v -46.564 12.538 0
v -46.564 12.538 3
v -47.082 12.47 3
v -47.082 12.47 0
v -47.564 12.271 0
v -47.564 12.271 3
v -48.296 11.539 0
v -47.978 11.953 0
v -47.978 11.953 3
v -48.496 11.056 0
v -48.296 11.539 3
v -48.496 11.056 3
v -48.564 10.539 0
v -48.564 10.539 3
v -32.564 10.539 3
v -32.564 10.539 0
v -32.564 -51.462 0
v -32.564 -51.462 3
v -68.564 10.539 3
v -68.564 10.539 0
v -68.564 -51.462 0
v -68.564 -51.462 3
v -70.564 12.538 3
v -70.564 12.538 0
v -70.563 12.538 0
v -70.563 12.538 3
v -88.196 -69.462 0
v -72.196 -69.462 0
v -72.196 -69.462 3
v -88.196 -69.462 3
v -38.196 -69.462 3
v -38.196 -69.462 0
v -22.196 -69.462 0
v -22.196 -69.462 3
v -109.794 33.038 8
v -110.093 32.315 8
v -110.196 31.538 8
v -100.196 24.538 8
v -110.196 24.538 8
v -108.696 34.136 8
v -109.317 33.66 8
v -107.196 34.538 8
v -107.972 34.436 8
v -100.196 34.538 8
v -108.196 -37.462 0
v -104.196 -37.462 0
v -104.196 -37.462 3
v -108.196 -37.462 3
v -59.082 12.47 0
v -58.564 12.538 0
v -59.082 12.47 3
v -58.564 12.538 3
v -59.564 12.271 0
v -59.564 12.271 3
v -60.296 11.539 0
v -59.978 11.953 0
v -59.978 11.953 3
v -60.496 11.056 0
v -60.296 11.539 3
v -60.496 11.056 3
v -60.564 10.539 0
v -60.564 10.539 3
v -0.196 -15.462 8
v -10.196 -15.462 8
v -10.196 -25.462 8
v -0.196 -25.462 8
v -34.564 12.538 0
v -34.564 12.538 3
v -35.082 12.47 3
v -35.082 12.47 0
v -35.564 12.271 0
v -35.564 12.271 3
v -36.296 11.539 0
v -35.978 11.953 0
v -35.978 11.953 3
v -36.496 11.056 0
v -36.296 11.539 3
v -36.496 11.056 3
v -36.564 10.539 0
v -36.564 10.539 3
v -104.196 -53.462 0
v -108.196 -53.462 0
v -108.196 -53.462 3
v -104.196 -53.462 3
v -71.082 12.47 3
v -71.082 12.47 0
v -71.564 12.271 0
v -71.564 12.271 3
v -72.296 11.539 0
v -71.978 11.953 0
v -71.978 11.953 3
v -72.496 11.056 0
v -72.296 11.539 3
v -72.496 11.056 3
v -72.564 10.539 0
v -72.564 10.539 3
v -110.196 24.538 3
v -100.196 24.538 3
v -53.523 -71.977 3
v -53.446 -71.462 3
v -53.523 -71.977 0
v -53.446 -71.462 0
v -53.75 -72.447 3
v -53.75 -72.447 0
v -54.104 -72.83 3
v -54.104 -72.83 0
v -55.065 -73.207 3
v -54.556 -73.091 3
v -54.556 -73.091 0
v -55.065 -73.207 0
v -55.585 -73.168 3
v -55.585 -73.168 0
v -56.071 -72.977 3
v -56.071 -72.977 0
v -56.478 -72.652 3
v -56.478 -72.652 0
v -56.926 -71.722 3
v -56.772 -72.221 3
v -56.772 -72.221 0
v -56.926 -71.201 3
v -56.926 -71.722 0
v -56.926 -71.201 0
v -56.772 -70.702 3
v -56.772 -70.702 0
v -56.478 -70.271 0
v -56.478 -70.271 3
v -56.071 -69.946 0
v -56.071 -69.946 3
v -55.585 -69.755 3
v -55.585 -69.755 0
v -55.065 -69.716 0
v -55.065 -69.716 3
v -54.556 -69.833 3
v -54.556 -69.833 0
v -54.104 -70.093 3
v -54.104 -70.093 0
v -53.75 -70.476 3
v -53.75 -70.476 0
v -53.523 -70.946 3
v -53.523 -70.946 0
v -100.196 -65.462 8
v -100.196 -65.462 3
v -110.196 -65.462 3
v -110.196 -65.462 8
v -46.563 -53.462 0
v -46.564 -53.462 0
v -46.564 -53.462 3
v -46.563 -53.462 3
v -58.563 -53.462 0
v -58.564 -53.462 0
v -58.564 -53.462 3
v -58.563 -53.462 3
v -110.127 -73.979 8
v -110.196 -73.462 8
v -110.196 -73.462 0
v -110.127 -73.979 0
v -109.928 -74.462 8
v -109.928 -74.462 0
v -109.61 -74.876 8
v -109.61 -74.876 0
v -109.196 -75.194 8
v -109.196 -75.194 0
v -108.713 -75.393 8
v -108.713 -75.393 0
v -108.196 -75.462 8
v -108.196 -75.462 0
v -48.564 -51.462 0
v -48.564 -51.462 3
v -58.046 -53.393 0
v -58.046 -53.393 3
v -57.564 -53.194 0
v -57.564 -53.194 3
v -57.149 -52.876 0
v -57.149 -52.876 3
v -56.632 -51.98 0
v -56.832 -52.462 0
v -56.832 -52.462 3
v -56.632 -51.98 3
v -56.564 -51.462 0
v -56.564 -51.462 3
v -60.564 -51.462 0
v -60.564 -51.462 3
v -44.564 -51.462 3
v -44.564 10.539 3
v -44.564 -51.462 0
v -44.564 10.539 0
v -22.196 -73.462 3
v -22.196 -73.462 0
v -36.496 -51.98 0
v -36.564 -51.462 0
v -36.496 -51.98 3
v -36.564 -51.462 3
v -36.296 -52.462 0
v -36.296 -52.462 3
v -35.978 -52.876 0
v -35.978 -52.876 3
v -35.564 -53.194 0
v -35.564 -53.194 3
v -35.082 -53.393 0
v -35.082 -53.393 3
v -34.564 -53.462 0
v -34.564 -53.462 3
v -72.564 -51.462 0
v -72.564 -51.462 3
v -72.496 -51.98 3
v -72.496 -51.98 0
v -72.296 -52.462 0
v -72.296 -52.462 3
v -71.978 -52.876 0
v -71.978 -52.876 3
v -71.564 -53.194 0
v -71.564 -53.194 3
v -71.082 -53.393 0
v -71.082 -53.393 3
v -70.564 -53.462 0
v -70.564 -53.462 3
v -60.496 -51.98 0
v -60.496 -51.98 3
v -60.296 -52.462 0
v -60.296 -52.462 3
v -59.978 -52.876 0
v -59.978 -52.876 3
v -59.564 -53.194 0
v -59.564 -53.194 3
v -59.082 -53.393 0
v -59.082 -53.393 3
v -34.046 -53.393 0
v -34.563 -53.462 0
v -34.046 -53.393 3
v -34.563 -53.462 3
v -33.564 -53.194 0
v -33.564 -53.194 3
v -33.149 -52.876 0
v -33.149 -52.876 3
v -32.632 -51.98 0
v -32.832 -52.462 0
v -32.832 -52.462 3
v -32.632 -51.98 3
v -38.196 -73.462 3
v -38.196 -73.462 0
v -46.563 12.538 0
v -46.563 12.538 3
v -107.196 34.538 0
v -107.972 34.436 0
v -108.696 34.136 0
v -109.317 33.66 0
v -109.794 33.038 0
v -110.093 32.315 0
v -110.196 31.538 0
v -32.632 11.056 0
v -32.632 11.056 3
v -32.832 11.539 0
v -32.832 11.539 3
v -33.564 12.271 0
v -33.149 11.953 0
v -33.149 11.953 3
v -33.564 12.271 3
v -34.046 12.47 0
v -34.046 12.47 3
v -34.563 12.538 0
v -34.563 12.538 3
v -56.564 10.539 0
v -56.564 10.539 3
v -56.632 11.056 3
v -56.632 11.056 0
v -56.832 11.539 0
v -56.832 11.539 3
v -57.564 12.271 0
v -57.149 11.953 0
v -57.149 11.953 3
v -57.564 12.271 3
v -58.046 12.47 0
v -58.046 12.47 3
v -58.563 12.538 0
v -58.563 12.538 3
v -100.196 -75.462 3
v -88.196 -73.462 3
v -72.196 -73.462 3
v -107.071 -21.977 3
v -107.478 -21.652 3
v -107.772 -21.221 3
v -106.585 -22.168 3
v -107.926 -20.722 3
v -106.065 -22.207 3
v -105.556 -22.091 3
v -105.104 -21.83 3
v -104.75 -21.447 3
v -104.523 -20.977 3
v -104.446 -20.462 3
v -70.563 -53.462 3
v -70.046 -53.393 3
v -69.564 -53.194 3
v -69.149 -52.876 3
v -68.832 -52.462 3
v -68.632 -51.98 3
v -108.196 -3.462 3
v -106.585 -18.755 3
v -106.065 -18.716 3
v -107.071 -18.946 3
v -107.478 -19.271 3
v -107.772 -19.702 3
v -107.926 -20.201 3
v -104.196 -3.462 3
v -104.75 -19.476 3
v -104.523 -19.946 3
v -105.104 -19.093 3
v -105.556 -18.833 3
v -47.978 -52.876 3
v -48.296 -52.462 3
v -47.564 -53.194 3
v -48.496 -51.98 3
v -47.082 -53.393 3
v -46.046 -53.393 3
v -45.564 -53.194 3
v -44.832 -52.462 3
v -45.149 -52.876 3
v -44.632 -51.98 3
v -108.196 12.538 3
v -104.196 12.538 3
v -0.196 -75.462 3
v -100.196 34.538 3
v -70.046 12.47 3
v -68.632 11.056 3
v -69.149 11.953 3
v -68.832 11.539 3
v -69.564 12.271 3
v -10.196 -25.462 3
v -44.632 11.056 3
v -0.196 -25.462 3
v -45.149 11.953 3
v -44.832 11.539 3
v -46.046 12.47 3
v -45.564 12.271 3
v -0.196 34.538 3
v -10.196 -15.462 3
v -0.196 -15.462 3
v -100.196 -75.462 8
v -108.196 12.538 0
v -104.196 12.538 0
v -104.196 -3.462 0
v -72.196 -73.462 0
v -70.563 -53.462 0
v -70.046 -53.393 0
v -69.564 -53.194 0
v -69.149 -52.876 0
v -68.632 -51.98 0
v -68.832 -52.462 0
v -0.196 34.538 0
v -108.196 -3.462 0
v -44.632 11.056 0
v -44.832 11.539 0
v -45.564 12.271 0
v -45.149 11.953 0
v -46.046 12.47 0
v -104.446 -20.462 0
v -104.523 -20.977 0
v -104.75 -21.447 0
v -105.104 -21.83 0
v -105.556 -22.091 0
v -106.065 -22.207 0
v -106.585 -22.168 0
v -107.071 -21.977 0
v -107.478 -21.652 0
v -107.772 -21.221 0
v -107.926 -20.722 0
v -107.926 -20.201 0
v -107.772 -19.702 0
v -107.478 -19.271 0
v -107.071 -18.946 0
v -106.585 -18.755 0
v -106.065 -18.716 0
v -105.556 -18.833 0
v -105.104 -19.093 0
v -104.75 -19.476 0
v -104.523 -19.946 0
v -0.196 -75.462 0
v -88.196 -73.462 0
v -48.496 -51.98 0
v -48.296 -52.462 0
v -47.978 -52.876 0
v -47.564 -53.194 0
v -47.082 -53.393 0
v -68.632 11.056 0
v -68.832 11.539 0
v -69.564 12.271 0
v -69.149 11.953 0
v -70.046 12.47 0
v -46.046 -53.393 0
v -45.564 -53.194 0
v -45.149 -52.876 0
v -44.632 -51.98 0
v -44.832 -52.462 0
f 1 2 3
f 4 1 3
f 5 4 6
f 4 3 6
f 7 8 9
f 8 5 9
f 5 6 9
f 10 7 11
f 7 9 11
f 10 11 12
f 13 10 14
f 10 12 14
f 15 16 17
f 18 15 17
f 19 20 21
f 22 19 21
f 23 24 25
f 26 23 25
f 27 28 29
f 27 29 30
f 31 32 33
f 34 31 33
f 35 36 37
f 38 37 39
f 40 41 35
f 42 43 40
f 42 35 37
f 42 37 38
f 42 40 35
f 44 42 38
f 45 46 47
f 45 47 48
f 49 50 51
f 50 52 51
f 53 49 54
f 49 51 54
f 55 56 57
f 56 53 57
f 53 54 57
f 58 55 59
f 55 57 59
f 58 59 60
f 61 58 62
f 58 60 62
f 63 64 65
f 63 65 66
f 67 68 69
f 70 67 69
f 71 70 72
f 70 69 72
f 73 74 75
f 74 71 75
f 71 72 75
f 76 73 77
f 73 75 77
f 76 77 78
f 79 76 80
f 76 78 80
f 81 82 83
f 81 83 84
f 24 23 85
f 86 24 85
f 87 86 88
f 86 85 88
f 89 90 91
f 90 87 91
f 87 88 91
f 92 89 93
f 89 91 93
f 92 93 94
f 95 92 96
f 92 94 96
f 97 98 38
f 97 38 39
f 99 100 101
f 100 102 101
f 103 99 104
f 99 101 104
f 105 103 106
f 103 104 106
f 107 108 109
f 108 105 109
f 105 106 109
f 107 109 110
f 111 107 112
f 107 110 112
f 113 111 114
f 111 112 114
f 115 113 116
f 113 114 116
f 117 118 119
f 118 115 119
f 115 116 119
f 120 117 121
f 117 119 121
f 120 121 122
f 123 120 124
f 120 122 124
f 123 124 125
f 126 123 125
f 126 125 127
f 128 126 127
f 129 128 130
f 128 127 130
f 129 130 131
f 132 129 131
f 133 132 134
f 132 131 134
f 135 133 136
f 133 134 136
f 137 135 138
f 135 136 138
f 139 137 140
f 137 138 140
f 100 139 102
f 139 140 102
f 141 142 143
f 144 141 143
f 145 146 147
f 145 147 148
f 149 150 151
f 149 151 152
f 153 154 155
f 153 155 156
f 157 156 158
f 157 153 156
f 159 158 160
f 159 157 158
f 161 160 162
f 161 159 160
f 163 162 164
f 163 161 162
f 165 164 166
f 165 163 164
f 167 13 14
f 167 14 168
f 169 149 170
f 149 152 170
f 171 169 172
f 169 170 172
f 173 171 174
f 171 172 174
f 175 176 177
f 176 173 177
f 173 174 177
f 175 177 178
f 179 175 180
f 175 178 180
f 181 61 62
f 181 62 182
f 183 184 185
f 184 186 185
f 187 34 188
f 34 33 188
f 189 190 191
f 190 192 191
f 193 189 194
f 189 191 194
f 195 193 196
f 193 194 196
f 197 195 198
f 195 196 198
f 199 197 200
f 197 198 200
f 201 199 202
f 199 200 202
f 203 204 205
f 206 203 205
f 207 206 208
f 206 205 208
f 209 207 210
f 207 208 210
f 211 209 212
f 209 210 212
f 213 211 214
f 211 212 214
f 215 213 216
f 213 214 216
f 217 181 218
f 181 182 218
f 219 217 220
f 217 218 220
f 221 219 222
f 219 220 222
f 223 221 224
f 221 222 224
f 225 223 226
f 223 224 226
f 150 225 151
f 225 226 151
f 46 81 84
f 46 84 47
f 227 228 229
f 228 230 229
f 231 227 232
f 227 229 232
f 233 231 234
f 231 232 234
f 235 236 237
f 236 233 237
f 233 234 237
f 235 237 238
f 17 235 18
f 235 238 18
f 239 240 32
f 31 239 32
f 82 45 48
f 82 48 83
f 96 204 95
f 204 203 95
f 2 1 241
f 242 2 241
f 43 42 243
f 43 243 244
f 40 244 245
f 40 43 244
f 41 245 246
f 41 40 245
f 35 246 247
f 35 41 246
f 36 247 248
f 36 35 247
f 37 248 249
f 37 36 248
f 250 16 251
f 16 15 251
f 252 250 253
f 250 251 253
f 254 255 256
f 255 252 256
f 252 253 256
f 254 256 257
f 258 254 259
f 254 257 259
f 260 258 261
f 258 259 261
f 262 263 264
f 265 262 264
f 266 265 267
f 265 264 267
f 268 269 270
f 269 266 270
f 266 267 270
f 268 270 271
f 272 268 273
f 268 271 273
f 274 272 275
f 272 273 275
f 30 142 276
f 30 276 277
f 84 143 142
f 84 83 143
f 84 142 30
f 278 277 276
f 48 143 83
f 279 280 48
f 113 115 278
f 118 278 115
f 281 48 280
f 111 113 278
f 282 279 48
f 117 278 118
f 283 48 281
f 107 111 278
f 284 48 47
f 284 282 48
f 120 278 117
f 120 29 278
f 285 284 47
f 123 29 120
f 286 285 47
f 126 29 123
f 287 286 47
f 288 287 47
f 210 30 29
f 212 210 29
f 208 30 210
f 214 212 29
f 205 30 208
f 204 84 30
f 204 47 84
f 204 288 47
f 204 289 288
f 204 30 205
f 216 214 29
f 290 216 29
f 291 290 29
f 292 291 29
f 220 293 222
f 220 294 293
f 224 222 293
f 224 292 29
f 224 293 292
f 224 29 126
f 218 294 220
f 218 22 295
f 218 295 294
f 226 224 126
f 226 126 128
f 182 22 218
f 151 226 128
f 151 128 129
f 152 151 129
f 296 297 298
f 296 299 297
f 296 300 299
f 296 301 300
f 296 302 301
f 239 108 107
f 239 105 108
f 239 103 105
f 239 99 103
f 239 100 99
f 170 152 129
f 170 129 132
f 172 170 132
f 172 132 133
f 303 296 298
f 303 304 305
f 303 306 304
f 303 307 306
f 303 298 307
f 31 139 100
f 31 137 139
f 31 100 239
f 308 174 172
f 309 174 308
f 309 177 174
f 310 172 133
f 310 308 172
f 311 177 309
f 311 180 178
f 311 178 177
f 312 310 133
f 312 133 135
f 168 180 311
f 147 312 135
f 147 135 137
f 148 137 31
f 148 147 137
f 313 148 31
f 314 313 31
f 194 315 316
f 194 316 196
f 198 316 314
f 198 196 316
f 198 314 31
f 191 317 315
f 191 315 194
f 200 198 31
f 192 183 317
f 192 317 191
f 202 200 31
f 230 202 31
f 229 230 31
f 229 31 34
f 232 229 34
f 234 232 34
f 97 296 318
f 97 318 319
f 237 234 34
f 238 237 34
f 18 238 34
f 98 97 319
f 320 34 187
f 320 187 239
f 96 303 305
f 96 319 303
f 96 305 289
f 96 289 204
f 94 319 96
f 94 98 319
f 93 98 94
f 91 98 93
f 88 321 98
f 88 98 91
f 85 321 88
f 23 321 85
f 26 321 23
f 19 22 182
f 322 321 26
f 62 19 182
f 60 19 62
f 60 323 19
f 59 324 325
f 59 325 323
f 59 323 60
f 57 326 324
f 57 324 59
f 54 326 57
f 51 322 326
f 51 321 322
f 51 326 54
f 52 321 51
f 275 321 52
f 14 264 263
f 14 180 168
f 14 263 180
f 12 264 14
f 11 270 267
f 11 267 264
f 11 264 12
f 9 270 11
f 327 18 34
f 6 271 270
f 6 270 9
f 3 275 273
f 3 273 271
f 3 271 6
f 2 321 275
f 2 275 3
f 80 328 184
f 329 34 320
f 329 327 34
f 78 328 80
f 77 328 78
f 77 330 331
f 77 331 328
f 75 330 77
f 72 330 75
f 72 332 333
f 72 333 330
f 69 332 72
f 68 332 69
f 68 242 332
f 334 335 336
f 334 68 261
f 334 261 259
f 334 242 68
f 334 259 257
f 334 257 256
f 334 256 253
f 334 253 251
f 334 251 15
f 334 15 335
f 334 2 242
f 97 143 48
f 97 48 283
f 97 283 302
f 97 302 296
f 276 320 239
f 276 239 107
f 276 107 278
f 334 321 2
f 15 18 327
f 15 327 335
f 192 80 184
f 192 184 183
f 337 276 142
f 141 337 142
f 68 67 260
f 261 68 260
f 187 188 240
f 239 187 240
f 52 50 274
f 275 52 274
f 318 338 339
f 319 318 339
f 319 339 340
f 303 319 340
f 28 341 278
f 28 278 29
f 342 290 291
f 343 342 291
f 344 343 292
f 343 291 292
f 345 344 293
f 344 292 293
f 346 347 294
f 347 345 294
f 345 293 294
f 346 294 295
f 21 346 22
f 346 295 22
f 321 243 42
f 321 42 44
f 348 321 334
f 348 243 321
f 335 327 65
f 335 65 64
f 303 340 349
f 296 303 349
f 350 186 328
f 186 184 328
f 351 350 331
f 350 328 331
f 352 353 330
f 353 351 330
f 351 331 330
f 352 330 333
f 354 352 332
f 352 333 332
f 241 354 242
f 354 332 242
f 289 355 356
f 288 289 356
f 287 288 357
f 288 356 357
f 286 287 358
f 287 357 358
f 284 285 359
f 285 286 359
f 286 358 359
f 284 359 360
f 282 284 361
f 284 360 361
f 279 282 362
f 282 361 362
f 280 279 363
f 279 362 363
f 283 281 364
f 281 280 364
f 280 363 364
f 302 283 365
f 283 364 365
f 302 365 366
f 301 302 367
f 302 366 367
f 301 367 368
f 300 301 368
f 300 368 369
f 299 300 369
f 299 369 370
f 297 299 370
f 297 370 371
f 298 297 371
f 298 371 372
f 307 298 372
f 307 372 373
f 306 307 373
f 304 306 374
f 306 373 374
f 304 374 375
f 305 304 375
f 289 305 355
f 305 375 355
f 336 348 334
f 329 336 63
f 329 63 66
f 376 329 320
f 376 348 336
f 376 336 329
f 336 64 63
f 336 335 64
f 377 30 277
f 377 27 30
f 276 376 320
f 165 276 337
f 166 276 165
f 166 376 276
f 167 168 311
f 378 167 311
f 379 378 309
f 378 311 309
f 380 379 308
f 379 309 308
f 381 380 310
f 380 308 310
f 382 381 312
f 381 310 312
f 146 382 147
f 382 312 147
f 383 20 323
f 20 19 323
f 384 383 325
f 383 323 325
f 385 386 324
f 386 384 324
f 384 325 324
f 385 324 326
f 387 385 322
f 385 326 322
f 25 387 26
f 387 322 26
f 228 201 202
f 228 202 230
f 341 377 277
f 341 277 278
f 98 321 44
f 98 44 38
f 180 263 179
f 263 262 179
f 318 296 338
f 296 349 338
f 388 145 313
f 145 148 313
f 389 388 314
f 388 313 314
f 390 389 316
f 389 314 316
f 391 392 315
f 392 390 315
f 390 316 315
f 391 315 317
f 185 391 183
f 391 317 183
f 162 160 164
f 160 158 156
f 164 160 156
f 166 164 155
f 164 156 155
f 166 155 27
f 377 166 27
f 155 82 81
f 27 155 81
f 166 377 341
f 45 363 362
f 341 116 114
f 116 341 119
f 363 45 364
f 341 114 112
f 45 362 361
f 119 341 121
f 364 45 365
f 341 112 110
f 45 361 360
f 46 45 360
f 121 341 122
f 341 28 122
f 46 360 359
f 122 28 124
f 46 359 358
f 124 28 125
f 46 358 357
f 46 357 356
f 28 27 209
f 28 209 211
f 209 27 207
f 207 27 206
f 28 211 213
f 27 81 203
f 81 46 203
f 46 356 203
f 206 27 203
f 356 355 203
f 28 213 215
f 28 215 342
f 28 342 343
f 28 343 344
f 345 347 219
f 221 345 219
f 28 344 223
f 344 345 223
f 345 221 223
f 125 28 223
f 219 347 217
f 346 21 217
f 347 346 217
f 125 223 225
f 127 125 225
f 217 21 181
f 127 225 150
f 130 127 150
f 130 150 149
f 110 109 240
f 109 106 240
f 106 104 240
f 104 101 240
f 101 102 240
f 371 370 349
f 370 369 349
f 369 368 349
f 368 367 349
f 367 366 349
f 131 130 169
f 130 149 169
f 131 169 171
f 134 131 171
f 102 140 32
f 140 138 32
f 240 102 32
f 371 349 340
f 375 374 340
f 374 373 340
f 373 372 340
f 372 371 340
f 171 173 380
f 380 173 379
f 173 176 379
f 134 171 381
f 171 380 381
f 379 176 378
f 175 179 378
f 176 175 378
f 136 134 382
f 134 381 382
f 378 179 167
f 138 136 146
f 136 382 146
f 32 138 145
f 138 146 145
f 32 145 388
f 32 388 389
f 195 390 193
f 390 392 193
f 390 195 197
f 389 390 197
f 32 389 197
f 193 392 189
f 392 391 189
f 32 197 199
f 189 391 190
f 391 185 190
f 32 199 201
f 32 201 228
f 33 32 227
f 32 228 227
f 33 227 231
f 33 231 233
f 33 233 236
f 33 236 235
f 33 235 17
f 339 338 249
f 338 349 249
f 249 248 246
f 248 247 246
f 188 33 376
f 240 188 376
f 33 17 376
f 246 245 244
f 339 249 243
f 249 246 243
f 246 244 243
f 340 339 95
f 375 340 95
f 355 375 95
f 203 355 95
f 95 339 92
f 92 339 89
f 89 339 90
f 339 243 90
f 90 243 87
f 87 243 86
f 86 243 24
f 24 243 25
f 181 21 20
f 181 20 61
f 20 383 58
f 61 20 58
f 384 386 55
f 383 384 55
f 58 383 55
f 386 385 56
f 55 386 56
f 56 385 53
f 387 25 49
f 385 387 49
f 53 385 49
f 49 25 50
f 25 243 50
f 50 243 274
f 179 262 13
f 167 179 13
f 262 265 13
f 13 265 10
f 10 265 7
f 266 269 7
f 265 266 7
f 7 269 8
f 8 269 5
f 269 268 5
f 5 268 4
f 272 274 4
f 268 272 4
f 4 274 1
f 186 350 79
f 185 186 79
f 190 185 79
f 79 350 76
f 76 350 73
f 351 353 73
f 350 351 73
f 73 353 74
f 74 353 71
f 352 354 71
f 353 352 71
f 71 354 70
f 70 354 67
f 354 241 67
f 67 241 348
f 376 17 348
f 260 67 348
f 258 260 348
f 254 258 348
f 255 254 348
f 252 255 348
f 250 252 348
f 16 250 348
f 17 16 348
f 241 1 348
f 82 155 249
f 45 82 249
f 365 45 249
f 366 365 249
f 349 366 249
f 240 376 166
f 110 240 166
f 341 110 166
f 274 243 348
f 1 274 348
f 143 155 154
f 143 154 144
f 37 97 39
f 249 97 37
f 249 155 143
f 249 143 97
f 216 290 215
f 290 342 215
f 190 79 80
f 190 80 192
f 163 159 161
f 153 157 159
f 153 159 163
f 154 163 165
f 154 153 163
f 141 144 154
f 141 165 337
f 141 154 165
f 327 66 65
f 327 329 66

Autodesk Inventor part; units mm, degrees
ref_plane "YZ Plane" through (0, 0, 0) normal (1, 0, 0) x (0, 1, 0)
ref_plane "XZ Plane" through (0, 0, 0) normal (0, 1, 0) x (-1, 0, 0)
ref_plane "XY Plane" through (0, 0, 0) normal (0, 0, 1) x (1, 0, 0)
sketch "Sketch1" plane through (0, 0, 0) normal (0, 0, 1) x (1, 0, 0)
  line L0 (-0.1956, -75.4616) -> (-110.1956, -75.4616)
  line L1 (-110.1956, -75.4616) -> (-110.1956, 34.5384)
  line L2 (-110.1956, 34.5384) -> (-0.1956, 34.5384)
  line L3 (-110.1956, 34.5384) -> (-108.1956, 34.5384) construction
  line L4 (-108.1956, 12.5384) -> (-104.1956, 12.5384)
  line L5 (-104.1956, 12.5384) -> (-104.1956, -3.4616)
  line L6 (-104.1956, -3.4616) -> (-108.1956, -3.4616)
  line L7 (-108.1956, -3.4616) -> (-108.1956, 12.5384)
  line L8 (-110.1956, 34.5384) -> (-110.1956, 32.5384) construction
  line L9 (-110.1956, -20.4616) -> (-0.1956, -20.4616) construction
  line L10 (-108.1956, -53.4616) -> (-104.1956, -53.4616)
  line L11 (-104.1956, -53.4616) -> (-104.1956, -37.4616)
  line L12 (-104.1956, -37.4616) -> (-108.1956, -37.4616)
  line L13 (-108.1956, -37.4616) -> (-108.1956, -53.4616)
  line L14 (-88.1956, -73.4616) -> (-72.1956, -73.4616)
  line L15 (-72.1956, -73.4616) -> (-72.1956, -69.4616)
  line L16 (-72.1956, -69.4616) -> (-88.1956, -69.4616)
  line L17 (-88.1956, -69.4616) -> (-88.1956, -73.4616)
  line L18 (-22.1956, -73.4616) -> (-38.1956, -73.4616)
  line L19 (-38.1956, -73.4616) -> (-38.1956, -69.4616)
  line L20 (-38.1956, -69.4616) -> (-22.1956, -69.4616)
  line L21 (-22.1956, -69.4616) -> (-22.1956, -73.4616)
  circle A0 centre (-55.1956, -71.4616) radius 1.75
  circle A1 centre (-106.1956, -20.4616) radius 1.75
  line L22 (-0.1956, 34.5384) -> (-0.1956, -75.4616)
  line L23 (-110.1956, 34.5384) -> (-100.1956, 34.5384)
  line L24 (-100.1956, 34.5384) -> (-100.1956, 24.5384)
  line L25 (-100.1956, 24.5384) -> (-110.1956, 24.5384)
  line L26 (-110.1956, 24.5384) -> (-110.1956, 34.5384)
  line L27 (-0.1956, -25.4616) -> (-10.1956, -25.4616)
  line L28 (-10.1956, -25.4616) -> (-10.1956, -15.4616)
  line L29 (-10.1956, -15.4616) -> (-0.1956, -15.4616)
  line L30 (-72.5638, 12.5384) -> (-68.5638, 12.5384)
  line L31 (-68.5638, 12.5384) -> (-68.5638, -53.4616)
  line L32 (-68.5638, -53.4616) -> (-72.5638, -53.4616)
  line L33 (-72.5638, -53.4616) -> (-72.5638, 12.5384)
  line L34 (-60.5638, 12.5384) -> (-60.5638, -53.4616)
  line L35 (-56.5638, 12.5384) -> (-56.5638, -53.4616)
  line L36 (-48.5638, 12.5384) -> (-48.5638, -53.4616)
  line L37 (-44.5638, 12.5384) -> (-44.5638, -53.4616)
  line L38 (-36.5638, 12.5384) -> (-36.5638, -53.4616)
  line L39 (-32.5638, 12.5384) -> (-32.5638, -53.4616)
  line L40 (-60.5638, -53.4616) -> (-56.5638, -53.4616)
  line L41 (-48.5638, -53.4616) -> (-44.5638, -53.4616)
  line L42 (-36.5638, -53.4616) -> (-32.5638, -53.4616)
  line L43 (-60.5638, 12.5384) -> (-56.5638, 12.5384)
  line L44 (-48.5638, 12.5384) -> (-44.5638, 12.5384)
  line L45 (-36.5638, 12.5384) -> (-32.5638, 12.5384)
  line L46 (-110.1956, -75.4616) -> (-100.1956, -75.4616)
  line L47 (-100.1956, -75.4616) -> (-100.1956, -65.4616)
  line L48 (-100.1956, -65.4616) -> (-110.1956, -65.4616)
  line L49 (-110.1956, -65.4616) -> (-110.1956, -75.4616)
  dimension "d5" = 110
  dimension "d6" = 110
  dimension "d7" = 2
  dimension "d8" = 22
  dimension "d10" = 4
  dimension "d11" = 16
  dimension "d12" = 2
  dimension "d20" = 3.5
  dimension "d21" = 10
  dimension "d22" = 10
  dimension "d25" = 10
  dimension "d26" = 4
  dimension "d30" = 4
  dimension "d33" = 4
  dimension "d34" = 4
  dimension "d35" = 4
  dimension "d37" = 10
  dimension "d38" = 10
extrude "Extrusion3" add sketch "Sketch1" along normal blind 3 contours L0 L47 L48 L1 L25 L24 L2 L22 L29 L28 L27
extrude "Extrusion4" add sketch "Sketch1" along normal blind 8 contours L0 L1 L48 L47 | L27 L28 L29 L22 | L1 L2 L24 L25
fillet "Fillet1" radius 3 1 edges at (-110.1956, 34.5384, 4)
fillet "Fillet2" radius 2 1 edges at (-110.1956, -75.4616, 4)
fillet "Fillet3" radius 2 16 edges at (-32.5638, 12.5384, 1.5) (-36.5638, 12.5384, 1.5) (-48.5638, 12.5384, 1.5) (-44.5638, 12.5384, 1.5) (-56.5638, 12.5384, 1.5) (-68.5638, 12.5384, 1.5) (-60.5638, 12.5384, 1.5) (-72.5638, 12.5384, 1.5) (-68.5638, -53.4616, 1.5) (-72.5638, -53.4616, 1.5) (-60.5638, -53.4616, 1.5) (-56.5638, -53.4616, 1.5) (-48.5638, -53.4616, 1.5) (-44.5638, -53.4616, 1.5) (-36.5638, -53.4616, 1.5) (-32.5638, -53.4616, 1.5)
properties part number "base_agitador"
